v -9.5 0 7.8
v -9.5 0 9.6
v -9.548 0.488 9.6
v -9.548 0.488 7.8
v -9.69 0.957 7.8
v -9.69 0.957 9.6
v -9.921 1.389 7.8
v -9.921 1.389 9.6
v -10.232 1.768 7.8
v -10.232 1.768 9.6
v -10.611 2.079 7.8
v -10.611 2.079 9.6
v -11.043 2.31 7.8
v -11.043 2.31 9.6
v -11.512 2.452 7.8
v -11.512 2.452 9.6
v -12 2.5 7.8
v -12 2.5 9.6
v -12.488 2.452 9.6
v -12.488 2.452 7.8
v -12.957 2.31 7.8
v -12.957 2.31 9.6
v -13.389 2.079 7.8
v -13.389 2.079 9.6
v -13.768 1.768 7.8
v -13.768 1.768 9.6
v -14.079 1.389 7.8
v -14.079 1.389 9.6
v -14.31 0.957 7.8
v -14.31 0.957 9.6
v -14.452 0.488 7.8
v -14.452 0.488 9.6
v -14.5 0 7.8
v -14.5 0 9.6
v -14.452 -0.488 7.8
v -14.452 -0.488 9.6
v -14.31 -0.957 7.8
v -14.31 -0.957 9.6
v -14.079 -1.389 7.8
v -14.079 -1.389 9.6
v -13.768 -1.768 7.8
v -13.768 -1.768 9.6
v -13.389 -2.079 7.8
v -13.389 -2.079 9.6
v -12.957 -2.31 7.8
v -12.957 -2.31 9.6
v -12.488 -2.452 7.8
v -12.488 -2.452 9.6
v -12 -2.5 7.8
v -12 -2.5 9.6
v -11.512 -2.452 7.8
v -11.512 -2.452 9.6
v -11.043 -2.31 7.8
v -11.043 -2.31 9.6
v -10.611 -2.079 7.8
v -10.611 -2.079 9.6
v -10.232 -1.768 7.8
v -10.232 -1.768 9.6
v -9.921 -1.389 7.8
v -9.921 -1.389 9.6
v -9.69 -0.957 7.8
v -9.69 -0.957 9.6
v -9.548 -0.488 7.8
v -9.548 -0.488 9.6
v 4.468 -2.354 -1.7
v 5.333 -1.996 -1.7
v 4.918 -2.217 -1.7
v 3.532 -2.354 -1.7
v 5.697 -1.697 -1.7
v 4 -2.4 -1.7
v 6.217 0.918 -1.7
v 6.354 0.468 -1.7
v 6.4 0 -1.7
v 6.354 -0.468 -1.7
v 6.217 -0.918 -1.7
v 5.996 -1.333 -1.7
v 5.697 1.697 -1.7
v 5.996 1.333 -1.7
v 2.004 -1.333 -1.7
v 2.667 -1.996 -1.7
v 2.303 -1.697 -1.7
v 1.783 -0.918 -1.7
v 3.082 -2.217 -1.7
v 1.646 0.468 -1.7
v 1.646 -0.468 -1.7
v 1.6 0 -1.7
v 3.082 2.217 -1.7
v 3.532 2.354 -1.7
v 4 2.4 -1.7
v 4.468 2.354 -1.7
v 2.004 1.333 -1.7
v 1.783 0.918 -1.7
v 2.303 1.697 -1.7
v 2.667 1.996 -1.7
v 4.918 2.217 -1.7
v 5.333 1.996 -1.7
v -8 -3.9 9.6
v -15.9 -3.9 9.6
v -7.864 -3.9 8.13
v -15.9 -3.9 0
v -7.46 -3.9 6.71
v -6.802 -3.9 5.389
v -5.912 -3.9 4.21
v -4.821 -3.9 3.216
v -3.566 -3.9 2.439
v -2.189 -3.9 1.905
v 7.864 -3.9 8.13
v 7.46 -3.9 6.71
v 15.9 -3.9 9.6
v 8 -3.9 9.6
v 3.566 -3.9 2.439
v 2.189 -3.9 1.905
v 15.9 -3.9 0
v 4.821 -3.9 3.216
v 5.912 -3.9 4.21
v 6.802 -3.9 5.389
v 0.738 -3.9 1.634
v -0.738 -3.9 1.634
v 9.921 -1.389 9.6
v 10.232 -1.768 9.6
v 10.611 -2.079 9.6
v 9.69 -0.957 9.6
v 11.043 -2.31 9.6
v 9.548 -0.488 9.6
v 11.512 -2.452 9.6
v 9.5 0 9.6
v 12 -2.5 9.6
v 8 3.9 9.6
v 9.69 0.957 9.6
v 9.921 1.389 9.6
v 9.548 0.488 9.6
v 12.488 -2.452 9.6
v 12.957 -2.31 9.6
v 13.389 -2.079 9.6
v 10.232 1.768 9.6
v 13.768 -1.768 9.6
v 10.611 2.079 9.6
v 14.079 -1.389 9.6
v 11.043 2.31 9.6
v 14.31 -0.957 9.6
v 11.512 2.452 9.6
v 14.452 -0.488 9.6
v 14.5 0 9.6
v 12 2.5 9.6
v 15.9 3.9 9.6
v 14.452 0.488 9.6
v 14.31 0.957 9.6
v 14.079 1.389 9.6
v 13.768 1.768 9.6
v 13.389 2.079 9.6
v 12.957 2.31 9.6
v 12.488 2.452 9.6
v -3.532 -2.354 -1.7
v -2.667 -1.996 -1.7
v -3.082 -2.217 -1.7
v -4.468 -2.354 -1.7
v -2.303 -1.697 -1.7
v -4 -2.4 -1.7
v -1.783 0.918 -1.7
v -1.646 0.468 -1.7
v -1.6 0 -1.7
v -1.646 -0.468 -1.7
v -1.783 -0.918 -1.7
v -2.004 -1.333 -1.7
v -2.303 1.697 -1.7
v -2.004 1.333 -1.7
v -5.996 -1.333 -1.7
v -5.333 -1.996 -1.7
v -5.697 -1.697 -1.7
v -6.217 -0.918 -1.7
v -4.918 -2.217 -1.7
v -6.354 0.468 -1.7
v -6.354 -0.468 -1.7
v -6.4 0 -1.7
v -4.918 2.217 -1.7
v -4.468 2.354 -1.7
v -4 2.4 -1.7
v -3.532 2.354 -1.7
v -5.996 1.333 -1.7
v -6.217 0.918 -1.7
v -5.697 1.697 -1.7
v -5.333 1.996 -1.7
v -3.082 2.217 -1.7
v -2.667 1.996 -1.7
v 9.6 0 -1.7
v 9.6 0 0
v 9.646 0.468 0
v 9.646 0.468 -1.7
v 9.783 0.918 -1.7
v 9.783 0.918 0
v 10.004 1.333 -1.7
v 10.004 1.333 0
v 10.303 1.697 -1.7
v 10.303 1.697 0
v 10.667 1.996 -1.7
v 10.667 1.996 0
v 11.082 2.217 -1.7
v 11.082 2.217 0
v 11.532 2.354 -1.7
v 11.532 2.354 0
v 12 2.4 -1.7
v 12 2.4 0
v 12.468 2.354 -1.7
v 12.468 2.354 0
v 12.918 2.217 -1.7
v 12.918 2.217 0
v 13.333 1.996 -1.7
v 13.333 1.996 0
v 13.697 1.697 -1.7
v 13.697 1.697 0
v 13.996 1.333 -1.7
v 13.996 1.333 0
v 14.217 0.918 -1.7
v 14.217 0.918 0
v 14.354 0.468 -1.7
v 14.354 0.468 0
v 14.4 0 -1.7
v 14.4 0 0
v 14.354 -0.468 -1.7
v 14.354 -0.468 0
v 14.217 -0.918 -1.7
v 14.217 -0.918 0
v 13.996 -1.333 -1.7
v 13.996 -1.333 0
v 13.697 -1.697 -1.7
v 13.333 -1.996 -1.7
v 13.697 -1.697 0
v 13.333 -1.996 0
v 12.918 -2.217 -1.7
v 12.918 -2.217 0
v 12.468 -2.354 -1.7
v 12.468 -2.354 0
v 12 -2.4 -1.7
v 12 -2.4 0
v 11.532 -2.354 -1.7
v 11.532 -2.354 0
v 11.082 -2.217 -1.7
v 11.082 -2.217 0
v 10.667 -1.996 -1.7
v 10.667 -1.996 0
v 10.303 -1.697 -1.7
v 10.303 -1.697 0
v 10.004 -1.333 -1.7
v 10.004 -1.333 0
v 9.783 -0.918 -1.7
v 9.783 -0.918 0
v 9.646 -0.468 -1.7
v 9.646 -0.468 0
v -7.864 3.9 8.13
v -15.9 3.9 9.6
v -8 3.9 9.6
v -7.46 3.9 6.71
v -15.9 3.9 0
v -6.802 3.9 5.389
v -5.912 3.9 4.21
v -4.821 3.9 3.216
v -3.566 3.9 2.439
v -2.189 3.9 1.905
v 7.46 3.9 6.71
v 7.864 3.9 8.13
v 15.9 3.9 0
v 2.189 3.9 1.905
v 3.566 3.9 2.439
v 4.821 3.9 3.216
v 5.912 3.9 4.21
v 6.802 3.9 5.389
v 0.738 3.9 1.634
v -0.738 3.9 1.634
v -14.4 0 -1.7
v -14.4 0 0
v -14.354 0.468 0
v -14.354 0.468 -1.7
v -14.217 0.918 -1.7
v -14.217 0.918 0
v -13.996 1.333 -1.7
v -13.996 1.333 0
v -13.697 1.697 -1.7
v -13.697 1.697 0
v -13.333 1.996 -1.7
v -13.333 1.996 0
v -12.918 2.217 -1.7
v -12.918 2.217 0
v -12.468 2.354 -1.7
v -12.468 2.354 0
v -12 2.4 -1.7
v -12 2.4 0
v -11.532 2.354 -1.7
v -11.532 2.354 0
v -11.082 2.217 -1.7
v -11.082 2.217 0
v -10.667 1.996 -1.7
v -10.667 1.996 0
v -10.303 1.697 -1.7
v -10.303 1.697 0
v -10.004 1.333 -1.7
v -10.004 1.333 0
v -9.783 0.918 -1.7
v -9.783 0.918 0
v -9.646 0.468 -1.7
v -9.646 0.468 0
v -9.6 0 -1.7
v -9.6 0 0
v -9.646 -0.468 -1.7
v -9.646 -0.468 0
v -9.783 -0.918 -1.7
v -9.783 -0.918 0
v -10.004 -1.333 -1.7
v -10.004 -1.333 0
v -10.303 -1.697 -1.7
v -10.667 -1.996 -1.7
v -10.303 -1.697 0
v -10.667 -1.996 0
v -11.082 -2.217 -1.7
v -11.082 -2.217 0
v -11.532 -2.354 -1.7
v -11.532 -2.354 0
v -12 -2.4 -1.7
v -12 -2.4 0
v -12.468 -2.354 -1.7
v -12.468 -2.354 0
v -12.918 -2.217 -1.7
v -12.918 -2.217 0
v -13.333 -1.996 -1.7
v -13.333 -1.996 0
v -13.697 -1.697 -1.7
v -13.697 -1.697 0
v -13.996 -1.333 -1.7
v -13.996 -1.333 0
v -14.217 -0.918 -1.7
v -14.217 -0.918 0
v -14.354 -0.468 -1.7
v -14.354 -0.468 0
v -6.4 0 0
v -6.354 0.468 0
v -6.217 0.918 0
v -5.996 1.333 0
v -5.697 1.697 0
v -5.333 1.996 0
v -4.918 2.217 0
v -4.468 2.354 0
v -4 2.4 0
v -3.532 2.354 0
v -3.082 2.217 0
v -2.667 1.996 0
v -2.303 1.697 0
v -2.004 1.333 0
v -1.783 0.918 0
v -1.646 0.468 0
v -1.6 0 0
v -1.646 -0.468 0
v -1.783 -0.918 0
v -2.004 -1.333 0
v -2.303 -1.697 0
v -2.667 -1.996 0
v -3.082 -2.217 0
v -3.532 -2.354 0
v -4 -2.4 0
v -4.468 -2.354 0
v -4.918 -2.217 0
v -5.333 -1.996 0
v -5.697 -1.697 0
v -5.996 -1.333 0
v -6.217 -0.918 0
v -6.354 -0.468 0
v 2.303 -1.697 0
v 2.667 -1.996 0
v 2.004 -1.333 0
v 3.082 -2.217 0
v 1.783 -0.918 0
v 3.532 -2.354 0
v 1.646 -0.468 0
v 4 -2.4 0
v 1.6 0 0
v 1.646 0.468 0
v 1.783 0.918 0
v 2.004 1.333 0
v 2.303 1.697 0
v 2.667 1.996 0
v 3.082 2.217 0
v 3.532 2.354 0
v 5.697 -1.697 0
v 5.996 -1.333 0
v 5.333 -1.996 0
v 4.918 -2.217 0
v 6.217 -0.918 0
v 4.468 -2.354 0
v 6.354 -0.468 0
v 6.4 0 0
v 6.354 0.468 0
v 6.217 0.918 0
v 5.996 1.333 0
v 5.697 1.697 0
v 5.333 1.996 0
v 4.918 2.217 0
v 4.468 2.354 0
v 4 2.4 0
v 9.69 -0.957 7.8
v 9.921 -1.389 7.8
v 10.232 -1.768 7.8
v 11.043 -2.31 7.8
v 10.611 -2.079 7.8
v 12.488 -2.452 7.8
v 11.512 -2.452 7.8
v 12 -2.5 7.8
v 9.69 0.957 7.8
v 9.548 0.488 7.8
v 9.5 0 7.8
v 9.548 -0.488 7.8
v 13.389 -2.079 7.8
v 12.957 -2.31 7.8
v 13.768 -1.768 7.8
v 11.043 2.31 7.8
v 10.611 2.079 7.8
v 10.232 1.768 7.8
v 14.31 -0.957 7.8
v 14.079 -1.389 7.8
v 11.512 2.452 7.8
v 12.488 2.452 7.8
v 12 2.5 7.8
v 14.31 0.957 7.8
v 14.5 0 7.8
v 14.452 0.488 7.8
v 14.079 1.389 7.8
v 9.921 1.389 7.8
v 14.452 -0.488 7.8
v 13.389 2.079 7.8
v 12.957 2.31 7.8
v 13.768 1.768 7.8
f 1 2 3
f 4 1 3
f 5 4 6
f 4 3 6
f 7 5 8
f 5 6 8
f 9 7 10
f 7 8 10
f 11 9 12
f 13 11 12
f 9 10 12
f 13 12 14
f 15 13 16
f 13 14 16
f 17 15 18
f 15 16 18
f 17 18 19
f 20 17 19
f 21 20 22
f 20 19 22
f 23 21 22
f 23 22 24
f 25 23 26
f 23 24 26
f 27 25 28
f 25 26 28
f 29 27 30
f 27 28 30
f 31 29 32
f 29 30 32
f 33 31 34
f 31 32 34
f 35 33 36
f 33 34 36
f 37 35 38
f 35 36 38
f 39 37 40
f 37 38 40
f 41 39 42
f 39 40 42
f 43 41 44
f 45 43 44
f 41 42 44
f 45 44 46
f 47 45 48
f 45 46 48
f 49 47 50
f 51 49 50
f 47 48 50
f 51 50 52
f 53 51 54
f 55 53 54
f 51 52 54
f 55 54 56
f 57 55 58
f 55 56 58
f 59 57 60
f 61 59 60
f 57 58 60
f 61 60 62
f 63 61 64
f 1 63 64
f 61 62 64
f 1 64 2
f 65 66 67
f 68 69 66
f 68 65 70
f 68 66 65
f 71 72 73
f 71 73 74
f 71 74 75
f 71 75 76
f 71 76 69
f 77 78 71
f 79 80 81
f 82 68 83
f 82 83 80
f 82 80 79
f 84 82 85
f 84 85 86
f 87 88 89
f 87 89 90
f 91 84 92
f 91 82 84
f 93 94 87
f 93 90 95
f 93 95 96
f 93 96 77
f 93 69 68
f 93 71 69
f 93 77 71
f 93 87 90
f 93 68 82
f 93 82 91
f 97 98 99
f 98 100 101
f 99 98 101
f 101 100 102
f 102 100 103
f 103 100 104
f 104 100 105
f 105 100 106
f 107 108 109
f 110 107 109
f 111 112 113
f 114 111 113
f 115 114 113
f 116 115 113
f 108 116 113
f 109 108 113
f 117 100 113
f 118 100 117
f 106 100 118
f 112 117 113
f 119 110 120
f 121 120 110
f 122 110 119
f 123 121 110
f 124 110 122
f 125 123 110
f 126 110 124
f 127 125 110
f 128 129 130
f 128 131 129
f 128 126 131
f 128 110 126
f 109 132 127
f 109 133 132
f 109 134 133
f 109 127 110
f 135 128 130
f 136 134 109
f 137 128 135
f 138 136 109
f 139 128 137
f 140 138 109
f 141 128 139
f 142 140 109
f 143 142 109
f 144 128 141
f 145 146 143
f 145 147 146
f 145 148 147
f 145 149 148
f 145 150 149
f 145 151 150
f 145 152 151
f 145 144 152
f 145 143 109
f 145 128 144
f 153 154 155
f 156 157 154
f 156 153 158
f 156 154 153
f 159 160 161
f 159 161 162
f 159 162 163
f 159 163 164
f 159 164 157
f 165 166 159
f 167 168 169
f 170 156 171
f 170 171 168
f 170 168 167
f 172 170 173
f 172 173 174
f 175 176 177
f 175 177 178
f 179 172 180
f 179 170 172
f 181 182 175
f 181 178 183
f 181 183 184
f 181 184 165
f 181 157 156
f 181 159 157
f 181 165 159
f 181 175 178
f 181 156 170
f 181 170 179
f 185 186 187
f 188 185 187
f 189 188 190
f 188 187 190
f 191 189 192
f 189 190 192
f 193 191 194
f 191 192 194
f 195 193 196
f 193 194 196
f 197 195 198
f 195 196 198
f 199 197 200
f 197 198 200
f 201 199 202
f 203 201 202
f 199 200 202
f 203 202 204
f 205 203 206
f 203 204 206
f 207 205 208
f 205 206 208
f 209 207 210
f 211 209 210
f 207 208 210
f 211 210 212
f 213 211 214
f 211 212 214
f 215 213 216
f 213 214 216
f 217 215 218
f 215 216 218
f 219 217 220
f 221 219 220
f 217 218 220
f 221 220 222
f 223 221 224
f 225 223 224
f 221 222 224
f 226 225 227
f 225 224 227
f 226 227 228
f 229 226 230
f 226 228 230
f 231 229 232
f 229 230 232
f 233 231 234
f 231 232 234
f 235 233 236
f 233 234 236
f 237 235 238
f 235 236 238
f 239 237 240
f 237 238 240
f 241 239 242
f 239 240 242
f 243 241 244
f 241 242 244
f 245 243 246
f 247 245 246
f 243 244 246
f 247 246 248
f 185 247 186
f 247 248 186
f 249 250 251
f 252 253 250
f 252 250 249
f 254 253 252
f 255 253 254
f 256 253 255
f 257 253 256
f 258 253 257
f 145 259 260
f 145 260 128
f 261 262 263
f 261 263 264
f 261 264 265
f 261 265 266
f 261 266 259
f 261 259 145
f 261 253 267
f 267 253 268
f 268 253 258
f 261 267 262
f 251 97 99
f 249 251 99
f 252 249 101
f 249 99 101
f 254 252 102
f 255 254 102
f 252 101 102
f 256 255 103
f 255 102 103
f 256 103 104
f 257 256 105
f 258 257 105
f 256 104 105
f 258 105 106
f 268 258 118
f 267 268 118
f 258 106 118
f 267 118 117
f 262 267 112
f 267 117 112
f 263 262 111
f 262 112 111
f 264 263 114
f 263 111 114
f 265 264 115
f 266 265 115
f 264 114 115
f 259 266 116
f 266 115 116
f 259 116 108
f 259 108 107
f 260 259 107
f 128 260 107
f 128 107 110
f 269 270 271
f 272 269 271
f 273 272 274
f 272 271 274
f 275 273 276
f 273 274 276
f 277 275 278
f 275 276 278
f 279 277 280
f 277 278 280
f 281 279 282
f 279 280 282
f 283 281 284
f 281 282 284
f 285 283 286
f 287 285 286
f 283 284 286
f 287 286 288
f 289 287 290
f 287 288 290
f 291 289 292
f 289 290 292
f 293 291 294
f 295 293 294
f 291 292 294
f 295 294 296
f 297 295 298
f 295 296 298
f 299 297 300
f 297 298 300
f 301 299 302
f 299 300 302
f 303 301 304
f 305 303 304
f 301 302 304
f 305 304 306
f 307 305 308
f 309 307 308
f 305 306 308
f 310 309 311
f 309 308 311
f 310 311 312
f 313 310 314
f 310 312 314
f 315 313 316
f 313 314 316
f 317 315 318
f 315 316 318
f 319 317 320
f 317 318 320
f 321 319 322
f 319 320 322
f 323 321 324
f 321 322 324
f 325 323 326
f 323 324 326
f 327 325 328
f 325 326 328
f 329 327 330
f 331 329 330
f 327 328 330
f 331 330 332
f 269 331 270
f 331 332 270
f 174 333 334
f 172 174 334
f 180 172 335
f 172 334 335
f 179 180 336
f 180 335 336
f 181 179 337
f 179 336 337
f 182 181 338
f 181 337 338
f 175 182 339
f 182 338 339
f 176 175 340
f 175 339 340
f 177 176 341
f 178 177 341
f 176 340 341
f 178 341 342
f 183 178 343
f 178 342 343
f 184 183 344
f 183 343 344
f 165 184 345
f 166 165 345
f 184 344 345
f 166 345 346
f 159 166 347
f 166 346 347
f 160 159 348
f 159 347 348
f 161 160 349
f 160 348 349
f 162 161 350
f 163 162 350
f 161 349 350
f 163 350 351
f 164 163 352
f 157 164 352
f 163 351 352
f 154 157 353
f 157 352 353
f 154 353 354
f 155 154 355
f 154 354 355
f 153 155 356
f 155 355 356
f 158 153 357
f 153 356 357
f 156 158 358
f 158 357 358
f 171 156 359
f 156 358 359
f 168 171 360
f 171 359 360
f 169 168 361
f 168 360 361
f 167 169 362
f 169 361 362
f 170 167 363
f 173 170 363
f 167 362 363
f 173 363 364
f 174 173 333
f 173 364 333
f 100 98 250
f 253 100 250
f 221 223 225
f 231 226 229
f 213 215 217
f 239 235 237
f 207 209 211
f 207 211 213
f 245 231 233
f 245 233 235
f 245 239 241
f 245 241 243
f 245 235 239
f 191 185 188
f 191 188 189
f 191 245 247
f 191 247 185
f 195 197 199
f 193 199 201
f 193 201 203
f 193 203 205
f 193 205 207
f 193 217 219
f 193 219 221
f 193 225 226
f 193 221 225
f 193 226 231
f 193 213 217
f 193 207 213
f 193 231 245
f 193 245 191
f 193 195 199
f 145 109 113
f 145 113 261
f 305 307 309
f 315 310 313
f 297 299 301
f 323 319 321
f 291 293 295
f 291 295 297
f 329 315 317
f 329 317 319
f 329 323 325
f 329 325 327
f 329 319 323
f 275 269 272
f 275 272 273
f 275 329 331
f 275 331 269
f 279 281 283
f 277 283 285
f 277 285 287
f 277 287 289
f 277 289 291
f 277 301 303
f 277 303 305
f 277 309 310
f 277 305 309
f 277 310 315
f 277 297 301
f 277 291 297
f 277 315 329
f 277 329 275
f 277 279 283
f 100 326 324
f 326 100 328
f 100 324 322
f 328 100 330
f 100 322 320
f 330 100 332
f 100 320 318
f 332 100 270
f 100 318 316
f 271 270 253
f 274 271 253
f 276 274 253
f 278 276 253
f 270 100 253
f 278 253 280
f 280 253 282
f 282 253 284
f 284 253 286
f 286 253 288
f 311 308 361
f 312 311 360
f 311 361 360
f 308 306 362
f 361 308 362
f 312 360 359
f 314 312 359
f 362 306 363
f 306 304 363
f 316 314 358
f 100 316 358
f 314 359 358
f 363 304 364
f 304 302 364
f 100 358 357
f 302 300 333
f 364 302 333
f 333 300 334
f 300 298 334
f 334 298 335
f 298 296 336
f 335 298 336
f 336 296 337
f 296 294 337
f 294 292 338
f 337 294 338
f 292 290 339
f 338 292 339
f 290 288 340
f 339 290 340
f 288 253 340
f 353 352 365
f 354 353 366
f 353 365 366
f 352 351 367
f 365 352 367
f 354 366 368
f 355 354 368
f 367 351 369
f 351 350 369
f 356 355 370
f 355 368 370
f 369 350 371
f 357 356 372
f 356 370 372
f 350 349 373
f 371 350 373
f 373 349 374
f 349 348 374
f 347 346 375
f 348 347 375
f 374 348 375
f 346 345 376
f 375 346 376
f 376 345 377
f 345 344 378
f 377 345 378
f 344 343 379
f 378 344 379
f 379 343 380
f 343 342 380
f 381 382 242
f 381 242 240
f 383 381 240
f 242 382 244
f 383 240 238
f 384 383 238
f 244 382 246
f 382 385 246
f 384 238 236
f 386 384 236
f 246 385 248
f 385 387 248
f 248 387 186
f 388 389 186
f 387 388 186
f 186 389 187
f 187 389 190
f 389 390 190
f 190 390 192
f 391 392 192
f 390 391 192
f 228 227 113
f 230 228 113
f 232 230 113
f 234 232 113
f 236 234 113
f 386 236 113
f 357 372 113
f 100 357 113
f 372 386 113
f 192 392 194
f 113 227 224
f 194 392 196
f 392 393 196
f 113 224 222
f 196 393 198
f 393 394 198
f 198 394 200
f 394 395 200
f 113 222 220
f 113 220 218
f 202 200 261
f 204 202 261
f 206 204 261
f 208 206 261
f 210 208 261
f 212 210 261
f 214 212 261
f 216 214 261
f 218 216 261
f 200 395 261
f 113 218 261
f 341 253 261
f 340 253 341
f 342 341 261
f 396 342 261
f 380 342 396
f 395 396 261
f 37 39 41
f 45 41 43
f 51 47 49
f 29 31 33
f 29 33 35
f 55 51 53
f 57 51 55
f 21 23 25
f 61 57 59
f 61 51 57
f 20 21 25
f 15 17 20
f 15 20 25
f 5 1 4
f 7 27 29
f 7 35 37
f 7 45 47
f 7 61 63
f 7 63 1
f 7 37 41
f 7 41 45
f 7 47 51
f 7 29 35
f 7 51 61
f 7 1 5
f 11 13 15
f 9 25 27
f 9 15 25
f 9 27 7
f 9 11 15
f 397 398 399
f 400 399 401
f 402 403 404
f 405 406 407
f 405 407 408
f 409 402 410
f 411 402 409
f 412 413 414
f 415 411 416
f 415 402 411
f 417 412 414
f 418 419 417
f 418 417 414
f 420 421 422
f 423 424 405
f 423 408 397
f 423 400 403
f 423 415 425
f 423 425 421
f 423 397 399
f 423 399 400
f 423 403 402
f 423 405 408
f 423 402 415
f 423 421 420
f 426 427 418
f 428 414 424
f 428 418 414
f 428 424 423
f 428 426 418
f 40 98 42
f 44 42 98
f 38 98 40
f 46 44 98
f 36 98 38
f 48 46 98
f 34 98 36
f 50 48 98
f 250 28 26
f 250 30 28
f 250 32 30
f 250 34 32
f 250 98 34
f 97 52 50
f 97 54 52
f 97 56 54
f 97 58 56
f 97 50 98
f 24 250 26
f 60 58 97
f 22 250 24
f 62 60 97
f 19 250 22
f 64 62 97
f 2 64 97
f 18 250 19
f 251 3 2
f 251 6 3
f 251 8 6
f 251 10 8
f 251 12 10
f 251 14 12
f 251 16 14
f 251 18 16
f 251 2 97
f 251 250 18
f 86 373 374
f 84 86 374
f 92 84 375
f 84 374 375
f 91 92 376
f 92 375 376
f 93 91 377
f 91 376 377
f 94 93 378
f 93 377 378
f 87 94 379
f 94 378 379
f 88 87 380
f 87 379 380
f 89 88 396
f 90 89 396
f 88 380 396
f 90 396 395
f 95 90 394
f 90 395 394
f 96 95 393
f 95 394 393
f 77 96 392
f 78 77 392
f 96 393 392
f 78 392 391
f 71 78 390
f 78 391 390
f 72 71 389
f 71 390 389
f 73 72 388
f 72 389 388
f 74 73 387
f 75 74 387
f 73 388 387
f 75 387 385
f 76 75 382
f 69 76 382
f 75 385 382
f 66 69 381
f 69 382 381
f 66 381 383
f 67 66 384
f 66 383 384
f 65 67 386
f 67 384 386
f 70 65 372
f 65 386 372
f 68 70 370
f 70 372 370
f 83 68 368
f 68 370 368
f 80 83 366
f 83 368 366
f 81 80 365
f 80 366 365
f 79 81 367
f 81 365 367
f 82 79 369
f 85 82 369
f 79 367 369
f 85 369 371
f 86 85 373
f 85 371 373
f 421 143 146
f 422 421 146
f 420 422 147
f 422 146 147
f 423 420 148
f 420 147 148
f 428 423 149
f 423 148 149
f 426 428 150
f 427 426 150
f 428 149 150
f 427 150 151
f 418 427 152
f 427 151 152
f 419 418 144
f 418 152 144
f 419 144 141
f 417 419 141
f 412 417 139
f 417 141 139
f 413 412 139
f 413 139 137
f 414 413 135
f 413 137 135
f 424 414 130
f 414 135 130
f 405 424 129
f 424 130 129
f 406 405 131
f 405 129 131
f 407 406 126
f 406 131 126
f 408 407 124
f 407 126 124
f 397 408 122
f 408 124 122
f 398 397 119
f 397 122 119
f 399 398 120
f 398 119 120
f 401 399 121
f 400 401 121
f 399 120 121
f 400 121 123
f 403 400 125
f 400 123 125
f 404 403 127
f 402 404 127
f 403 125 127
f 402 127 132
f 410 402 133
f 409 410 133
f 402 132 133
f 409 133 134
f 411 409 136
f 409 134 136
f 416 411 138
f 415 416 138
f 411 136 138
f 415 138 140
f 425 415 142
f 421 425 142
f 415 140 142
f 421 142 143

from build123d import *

# Parameters (mm, degrees)
SKETCH_1_W          = 31.8
SKETCH_1_H          = 7.8
EXTRUDE_2_DEPTH     = 9.6
SKETCH_2_R          = 2.4
EXTRUDE_3_DEPTH     = 1.7
CUT_EXTRUDE_2_DEPTH = 21.144726357
SKETCH_4_R          = 2.5
CUT_EXTRUDE_3_DEPTH = 1.8


with BuildPart() as part:
    # Эскиз1 → Бобышка-Вытянуть2 (new body)
    with BuildSketch(Plane.XY):
        Rectangle(SKETCH_1_W, SKETCH_1_H)
    extrude(amount=EXTRUDE_2_DEPTH)

    # Эскиз2 → Бобышка-Вытянуть3 (add)
    with BuildSketch(Plane(origin=(0, 0, 0), x_dir=(-1, 0, 0), z_dir=(0, 0, -1))):
        with Locations((-12, 0)):
            Circle(SKETCH_2_R)
        with Locations((-4, 0)):
            Circle(SKETCH_2_R)
        with Locations((4, 0)):
            Circle(SKETCH_2_R)
        with Locations((12, 0)):
            Circle(SKETCH_2_R)
    extrude(amount=EXTRUDE_3_DEPTH)

    # Эскиз3 → Вырез-Вытянуть2 (cut, through all)
    with BuildSketch(Plane.XZ.offset(3.9)):
        with BuildLine():
            Line((8, 9.6), (-8, 9.6))
            ThreePointArc((-8, 9.6), (0, 1.6), (8, 9.6))
        make_face()
    extrude(amount=-CUT_EXTRUDE_2_DEPTH, mode=Mode.SUBTRACT)

    # Эскиз4 → Вырез-Вытянуть3 (cut)
    with BuildSketch(Plane.XY.offset(9.6)):
        with Locations((12, 0)):
            Circle(SKETCH_4_R)
        with Locations((-12, 0)):
            Circle(SKETCH_4_R)
    extrude(amount=-CUT_EXTRUDE_3_DEPTH, mode=Mode.SUBTRACT)


solid = part.part
